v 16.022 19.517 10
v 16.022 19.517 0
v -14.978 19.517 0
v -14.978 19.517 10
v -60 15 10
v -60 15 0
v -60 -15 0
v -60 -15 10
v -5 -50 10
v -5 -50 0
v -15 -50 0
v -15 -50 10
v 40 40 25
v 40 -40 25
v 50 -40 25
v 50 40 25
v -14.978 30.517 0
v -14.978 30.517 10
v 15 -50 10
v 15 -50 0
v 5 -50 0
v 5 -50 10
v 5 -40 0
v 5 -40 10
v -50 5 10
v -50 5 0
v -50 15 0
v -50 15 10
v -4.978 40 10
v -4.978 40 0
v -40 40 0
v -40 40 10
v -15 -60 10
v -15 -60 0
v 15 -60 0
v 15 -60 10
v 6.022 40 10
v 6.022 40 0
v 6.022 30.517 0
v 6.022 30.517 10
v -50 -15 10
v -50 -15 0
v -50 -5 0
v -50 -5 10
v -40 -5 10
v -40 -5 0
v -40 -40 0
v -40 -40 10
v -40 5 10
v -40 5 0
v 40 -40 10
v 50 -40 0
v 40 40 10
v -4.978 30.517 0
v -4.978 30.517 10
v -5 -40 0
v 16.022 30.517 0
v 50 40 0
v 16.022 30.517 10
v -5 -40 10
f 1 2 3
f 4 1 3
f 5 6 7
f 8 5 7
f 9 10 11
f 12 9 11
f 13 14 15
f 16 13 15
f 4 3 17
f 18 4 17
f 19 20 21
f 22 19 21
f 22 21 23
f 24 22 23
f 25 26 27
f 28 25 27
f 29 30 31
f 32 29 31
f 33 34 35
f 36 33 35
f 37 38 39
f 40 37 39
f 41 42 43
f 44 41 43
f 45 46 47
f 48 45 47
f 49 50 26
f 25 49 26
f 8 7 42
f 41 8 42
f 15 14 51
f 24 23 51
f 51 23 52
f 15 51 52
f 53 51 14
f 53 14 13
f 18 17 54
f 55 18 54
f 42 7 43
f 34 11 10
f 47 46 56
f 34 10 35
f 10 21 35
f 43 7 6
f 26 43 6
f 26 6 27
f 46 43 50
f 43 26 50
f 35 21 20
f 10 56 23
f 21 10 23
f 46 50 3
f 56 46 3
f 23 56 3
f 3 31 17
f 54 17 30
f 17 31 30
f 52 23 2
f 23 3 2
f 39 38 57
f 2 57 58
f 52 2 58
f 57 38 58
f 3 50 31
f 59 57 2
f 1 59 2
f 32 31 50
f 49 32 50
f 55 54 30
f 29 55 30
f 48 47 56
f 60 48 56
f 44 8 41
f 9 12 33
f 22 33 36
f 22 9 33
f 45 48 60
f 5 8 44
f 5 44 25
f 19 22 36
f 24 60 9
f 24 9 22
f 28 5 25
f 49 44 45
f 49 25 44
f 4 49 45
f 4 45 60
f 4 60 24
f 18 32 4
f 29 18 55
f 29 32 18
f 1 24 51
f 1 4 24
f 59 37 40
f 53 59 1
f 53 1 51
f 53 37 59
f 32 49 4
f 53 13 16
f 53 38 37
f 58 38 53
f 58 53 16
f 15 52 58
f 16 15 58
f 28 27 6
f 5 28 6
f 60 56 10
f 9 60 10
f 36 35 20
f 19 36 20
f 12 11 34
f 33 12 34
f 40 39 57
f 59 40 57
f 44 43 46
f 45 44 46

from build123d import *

# Parameters (mm, degrees)
F1_DEPTH = 10
F0_W     = 10
F0_H     = 80
F2_DEPTH = 25


with BuildPart() as f1:
    # F0 (on Top) → F1 (new body)
    with BuildSketch(Plane.XY):
        Polygon((-4.978042, 40), (-40, 40), (-40, 5), (-50, 5), (-50, 15), (-60, 15), (-60, -15), (-50, -15), (-50, -5), (-40, -5), (-40, -40), (-5, -40), (-5, -50), (-15, -50), (-15, -60), (15, -60), (15, -50), (5, -50), (5, -40), (40, -40), (40, 40), (6.021958, 40), (6.021958, 30.516871), (16.021958, 30.516871), (16.021958, 19.516871), (-14.978042, 19.516871), (-14.978042, 30.516871), (-4.978042, 30.516871), align=None)
    extrude(amount=F1_DEPTH)

    # F0 (on Top) → F2 (join)
    with BuildSketch(Plane.XY):
        with Locations((45, 0)):
            Rectangle(F0_W, F0_H)
    extrude(amount=F2_DEPTH)


solid = f1.part
